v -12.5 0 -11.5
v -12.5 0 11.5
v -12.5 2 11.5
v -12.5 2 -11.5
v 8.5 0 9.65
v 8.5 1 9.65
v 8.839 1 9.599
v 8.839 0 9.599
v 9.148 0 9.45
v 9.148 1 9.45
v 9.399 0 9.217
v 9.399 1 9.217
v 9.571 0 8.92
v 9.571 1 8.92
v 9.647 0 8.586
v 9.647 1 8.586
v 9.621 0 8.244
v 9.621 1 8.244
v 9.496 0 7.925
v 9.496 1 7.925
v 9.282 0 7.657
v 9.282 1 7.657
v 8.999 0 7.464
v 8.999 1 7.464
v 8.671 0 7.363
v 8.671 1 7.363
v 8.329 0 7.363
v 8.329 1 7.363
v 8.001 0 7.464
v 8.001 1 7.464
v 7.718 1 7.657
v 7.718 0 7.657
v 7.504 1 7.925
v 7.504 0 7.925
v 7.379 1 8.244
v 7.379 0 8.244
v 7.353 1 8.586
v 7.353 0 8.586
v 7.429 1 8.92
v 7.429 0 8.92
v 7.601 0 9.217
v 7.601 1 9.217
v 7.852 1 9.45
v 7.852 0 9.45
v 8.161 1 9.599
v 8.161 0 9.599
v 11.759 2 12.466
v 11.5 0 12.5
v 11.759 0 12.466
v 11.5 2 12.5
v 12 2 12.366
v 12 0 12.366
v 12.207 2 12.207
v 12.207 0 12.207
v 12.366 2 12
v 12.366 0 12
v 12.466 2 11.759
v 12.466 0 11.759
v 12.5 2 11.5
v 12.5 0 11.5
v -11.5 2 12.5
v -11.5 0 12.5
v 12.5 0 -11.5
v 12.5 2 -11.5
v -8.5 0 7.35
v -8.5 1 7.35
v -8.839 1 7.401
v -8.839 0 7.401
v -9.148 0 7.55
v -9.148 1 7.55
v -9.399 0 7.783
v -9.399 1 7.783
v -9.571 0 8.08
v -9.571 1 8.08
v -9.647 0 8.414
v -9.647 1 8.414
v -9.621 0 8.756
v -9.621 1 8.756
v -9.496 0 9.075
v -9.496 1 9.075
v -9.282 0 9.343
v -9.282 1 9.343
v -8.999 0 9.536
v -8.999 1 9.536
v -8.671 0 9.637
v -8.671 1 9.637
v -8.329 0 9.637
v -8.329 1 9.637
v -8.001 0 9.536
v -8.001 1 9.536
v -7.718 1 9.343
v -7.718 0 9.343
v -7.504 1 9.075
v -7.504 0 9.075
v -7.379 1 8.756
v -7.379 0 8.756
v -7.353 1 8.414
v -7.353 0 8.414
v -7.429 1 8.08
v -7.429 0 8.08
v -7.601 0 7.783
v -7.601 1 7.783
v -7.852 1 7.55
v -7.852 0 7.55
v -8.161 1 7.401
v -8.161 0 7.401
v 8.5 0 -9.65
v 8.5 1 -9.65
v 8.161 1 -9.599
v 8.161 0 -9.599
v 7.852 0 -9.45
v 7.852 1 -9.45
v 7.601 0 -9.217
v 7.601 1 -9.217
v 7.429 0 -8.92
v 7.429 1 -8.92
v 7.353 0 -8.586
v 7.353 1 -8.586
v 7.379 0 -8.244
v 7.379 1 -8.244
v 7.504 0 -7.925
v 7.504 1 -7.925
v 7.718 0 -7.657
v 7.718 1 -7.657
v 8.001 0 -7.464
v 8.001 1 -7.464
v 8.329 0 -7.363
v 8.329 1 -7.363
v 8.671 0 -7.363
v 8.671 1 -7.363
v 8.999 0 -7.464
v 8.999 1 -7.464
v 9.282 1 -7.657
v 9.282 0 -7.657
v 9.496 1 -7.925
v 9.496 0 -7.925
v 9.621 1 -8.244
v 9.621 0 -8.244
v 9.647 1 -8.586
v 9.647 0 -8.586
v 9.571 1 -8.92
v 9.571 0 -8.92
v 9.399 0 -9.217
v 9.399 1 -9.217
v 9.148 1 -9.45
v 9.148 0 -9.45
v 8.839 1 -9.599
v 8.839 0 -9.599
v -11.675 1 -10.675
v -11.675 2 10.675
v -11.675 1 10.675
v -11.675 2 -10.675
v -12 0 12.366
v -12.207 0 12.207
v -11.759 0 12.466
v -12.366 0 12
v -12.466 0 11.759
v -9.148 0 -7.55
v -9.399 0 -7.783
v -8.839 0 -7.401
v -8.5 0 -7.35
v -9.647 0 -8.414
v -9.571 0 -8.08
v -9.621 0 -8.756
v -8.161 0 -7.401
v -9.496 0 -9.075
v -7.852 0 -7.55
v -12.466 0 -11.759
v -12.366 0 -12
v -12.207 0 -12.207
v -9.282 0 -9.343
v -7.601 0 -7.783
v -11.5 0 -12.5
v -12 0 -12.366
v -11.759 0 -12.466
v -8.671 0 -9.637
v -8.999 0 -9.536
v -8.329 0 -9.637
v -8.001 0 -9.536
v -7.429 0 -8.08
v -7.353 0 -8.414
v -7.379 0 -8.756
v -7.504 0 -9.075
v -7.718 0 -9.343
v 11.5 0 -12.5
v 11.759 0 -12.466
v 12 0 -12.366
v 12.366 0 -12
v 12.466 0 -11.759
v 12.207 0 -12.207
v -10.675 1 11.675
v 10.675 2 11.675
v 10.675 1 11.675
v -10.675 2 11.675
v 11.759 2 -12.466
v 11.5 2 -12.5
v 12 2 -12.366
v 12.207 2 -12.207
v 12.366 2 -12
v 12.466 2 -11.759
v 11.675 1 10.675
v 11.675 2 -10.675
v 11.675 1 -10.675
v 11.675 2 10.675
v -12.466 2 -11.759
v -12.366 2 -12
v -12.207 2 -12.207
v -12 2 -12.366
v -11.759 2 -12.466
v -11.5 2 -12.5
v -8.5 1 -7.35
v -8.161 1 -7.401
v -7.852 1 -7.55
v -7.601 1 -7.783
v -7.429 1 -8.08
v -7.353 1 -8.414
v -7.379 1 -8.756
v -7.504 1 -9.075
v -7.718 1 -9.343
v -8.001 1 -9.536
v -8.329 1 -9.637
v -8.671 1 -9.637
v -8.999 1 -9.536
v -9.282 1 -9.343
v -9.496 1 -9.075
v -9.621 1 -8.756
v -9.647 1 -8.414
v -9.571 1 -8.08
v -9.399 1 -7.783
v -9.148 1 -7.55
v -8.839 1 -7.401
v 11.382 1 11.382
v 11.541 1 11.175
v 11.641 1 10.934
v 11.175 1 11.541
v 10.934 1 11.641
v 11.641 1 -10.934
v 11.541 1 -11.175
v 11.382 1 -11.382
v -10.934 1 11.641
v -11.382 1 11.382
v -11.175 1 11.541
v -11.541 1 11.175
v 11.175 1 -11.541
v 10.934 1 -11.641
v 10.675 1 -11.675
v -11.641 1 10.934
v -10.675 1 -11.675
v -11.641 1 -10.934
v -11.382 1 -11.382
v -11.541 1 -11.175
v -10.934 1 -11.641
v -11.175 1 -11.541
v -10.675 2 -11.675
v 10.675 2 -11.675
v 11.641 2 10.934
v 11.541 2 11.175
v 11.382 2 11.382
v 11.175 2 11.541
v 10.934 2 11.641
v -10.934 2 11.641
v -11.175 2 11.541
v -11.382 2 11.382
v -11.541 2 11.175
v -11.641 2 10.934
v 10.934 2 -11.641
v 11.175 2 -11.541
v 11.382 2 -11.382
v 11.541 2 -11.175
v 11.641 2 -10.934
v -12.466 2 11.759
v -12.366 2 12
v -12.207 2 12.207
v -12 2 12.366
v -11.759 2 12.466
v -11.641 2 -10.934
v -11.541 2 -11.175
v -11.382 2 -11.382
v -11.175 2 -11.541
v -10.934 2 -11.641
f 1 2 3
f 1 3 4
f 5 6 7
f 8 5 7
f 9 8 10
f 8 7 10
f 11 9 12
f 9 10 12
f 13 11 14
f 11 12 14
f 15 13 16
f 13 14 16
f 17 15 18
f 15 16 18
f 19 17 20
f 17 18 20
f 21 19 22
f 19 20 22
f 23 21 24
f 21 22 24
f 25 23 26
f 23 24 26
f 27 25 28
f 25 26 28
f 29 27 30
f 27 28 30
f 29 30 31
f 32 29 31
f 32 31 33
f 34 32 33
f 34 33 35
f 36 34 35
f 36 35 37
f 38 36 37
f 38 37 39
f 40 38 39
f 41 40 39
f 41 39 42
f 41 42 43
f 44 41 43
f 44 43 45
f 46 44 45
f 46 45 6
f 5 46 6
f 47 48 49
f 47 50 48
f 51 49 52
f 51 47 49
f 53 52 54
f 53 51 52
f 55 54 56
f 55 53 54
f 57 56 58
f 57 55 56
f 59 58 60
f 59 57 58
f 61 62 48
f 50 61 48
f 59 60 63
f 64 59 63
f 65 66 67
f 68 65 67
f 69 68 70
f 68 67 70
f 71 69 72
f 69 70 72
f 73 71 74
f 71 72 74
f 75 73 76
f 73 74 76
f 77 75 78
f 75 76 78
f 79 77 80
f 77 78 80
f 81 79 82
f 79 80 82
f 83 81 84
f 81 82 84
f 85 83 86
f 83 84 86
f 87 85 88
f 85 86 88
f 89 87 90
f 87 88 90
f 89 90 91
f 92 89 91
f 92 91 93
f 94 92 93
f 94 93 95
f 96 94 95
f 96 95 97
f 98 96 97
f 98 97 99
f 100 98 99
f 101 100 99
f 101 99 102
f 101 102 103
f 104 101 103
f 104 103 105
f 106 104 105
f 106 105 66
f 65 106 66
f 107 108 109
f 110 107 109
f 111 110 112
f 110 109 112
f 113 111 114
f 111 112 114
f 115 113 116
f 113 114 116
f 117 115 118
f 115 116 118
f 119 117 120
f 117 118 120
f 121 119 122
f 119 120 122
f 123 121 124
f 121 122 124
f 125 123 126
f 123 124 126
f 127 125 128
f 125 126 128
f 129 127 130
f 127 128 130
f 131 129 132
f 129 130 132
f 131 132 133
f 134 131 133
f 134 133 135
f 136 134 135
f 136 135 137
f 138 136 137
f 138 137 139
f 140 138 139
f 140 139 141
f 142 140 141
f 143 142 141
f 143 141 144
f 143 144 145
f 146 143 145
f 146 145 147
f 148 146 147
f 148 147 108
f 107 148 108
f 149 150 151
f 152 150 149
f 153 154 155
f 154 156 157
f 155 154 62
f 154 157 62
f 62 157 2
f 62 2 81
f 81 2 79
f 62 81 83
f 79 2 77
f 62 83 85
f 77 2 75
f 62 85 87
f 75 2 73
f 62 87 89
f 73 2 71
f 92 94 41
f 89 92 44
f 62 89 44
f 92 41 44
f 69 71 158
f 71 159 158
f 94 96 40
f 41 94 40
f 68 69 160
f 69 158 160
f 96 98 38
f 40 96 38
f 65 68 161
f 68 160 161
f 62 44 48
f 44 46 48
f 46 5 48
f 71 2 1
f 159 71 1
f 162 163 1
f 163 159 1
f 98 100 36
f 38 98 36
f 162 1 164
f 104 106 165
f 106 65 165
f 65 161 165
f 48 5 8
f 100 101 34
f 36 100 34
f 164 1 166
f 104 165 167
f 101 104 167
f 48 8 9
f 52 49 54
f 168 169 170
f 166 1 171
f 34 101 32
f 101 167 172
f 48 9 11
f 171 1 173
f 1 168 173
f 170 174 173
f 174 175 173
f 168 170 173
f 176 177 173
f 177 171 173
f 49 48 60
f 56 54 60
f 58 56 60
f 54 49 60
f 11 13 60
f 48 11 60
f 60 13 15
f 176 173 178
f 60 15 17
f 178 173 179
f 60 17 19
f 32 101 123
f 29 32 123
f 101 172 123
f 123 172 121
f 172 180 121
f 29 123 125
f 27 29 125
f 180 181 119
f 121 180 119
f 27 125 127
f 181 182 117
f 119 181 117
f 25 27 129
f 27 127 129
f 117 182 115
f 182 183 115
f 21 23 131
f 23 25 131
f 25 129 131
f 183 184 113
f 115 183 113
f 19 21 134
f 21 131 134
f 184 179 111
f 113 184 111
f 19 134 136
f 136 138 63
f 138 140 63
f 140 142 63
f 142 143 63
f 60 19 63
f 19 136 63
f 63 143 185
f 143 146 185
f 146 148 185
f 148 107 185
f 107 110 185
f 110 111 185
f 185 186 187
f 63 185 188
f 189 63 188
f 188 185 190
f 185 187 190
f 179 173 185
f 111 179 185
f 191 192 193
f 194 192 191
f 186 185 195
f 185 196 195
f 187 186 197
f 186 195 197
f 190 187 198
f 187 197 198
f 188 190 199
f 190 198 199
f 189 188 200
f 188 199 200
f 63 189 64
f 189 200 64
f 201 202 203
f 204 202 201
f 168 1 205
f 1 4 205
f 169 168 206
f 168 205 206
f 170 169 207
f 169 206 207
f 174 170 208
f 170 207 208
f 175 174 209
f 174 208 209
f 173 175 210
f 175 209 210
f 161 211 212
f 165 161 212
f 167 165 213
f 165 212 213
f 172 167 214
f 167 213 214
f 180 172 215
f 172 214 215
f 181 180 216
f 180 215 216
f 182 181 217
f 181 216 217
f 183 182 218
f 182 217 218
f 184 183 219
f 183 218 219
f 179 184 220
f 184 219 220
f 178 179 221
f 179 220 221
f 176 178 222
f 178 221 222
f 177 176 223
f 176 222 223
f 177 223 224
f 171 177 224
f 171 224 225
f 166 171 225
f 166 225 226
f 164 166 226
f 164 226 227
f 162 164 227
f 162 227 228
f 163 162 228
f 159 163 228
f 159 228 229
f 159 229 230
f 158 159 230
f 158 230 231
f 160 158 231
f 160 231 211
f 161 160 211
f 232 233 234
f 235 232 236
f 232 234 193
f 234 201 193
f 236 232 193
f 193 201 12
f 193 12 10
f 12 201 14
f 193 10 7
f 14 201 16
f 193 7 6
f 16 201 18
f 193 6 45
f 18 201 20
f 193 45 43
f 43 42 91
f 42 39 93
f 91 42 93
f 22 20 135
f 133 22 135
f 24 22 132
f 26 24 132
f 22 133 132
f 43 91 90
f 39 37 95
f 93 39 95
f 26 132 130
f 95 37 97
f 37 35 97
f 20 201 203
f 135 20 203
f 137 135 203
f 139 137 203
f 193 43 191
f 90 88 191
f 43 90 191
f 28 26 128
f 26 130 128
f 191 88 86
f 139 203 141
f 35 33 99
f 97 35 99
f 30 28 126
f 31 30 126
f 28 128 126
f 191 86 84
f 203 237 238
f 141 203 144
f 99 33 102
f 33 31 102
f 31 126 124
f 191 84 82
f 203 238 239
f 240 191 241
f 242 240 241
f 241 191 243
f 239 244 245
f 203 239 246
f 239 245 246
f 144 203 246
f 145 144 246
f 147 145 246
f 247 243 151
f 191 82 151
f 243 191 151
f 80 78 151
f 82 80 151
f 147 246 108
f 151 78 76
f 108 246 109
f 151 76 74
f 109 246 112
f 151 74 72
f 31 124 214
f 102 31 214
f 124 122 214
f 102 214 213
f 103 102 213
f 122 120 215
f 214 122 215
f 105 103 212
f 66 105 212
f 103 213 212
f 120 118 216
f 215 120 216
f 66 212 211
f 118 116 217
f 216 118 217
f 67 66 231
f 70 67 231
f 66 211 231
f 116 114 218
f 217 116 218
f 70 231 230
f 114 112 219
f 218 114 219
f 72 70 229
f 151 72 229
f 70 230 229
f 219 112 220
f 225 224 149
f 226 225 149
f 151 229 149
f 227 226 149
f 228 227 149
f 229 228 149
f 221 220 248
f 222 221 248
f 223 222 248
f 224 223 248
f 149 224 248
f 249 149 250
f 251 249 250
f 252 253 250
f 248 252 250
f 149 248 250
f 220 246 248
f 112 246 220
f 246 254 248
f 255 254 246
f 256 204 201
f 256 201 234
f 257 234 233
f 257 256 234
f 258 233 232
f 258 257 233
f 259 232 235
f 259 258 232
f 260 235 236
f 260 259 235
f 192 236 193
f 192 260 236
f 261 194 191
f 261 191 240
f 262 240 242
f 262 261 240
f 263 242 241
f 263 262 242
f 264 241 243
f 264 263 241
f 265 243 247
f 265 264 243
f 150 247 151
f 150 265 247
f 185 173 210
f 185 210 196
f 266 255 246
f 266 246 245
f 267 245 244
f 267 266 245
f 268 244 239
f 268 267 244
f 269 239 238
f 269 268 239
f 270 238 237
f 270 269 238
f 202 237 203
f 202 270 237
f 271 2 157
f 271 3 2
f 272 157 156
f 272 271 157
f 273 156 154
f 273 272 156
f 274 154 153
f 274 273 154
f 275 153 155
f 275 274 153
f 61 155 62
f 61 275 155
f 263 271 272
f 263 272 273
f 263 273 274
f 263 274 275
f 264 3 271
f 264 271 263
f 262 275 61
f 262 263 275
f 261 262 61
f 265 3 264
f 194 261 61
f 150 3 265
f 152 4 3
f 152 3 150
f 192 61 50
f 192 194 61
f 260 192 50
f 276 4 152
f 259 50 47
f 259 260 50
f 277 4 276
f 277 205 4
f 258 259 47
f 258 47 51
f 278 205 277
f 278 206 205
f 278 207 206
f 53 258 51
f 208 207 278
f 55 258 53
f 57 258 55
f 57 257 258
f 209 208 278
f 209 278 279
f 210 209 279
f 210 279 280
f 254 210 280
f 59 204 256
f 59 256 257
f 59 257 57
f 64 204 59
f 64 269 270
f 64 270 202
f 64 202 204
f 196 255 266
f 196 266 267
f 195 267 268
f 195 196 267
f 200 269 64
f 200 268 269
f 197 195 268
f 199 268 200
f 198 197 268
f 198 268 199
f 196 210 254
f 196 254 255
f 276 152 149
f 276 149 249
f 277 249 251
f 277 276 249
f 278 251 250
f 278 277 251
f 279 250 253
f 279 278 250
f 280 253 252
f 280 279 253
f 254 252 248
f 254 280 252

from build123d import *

# Parameters (mm, degrees)
SKETCH1_W           = 25
SKETCH1_H           = 25
BOSS_EXTRUDE1_DEPTH = 2
SKETCH2_R           = 1.15
CUT_EXTRUDE1_DEPTH  = 2
CUT_EXTRUDE2_DEPTH  = 1
FILLET1_R           = 1


with BuildPart() as part:
    # Sketch1 → Boss-Extrude1 (new body)
    with BuildSketch(Plane(origin=(0, 0, 0), x_dir=(1, 0, 0), z_dir=(0, 1, 0))):
        Rectangle(SKETCH1_W, SKETCH1_H)
    extrude(amount=BOSS_EXTRUDE1_DEPTH)

    # Sketch2 → Cut-Extrude1 (cut)
    with BuildSketch(Plane(origin=(0, 2, 0), x_dir=(1, 0, 0), z_dir=(0, 1, 0))):
        with Locations(Location((-8.5, 8.5, 0), (0, 0, 270))):
            Circle(SKETCH2_R)
        with Locations(Location((-8.5, -8.5, 0), (0, 0, 90))):
            Circle(SKETCH2_R)
        with Locations(Location((8.5, -8.5, 0), (0, 0, 270))):
            Circle(SKETCH2_R)
        with Locations(Location((8.5, 8.5, 0), (0, 0, 90))):
            Circle(SKETCH2_R)
    extrude(amount=-CUT_EXTRUDE1_DEPTH, mode=Mode.SUBTRACT)

    # Sketch3 → Cut-Extrude2 (cut)
    with BuildSketch(Plane(origin=(0, 2, 0), x_dir=(1, 0, 0), z_dir=(0, 1, 0))):
        with BuildLine():
            Line((10.675, -11.675), (-10.675, -11.675))
            ThreePointArc((-10.675, -11.675), (-11.382106781, -11.382106781), (-11.675, -10.675))
            Line((-11.675, -10.675), (-11.675, 10.675))
            ThreePointArc((-11.675, 10.675), (-11.382106781, 11.382106781), (-10.675, 11.675))
            Line((-10.675, 11.675), (10.675, 11.675))
            ThreePointArc((10.675, 11.675), (11.382106781, 11.382106781), (11.675, 10.675))
            Line((11.675, 10.675), (11.675, -10.675))
            ThreePointArc((11.675, -10.675), (11.382106781, -11.382106781), (10.675, -11.675))
        make_face()
    extrude(amount=-CUT_EXTRUDE2_DEPTH, mode=Mode.SUBTRACT)

    # Fillet1
    fillet1_edges = [part.edges().sort_by_distance(p)[0] for p in [
        (12.5, 1, 12.5),
        (-12.5, 1, 12.5),
        (-12.5, 1, -12.5),
        (12.5, 1, -12.5),
    ]]
    fillet(fillet1_edges, radius=FILLET1_R)


solid = part.part
